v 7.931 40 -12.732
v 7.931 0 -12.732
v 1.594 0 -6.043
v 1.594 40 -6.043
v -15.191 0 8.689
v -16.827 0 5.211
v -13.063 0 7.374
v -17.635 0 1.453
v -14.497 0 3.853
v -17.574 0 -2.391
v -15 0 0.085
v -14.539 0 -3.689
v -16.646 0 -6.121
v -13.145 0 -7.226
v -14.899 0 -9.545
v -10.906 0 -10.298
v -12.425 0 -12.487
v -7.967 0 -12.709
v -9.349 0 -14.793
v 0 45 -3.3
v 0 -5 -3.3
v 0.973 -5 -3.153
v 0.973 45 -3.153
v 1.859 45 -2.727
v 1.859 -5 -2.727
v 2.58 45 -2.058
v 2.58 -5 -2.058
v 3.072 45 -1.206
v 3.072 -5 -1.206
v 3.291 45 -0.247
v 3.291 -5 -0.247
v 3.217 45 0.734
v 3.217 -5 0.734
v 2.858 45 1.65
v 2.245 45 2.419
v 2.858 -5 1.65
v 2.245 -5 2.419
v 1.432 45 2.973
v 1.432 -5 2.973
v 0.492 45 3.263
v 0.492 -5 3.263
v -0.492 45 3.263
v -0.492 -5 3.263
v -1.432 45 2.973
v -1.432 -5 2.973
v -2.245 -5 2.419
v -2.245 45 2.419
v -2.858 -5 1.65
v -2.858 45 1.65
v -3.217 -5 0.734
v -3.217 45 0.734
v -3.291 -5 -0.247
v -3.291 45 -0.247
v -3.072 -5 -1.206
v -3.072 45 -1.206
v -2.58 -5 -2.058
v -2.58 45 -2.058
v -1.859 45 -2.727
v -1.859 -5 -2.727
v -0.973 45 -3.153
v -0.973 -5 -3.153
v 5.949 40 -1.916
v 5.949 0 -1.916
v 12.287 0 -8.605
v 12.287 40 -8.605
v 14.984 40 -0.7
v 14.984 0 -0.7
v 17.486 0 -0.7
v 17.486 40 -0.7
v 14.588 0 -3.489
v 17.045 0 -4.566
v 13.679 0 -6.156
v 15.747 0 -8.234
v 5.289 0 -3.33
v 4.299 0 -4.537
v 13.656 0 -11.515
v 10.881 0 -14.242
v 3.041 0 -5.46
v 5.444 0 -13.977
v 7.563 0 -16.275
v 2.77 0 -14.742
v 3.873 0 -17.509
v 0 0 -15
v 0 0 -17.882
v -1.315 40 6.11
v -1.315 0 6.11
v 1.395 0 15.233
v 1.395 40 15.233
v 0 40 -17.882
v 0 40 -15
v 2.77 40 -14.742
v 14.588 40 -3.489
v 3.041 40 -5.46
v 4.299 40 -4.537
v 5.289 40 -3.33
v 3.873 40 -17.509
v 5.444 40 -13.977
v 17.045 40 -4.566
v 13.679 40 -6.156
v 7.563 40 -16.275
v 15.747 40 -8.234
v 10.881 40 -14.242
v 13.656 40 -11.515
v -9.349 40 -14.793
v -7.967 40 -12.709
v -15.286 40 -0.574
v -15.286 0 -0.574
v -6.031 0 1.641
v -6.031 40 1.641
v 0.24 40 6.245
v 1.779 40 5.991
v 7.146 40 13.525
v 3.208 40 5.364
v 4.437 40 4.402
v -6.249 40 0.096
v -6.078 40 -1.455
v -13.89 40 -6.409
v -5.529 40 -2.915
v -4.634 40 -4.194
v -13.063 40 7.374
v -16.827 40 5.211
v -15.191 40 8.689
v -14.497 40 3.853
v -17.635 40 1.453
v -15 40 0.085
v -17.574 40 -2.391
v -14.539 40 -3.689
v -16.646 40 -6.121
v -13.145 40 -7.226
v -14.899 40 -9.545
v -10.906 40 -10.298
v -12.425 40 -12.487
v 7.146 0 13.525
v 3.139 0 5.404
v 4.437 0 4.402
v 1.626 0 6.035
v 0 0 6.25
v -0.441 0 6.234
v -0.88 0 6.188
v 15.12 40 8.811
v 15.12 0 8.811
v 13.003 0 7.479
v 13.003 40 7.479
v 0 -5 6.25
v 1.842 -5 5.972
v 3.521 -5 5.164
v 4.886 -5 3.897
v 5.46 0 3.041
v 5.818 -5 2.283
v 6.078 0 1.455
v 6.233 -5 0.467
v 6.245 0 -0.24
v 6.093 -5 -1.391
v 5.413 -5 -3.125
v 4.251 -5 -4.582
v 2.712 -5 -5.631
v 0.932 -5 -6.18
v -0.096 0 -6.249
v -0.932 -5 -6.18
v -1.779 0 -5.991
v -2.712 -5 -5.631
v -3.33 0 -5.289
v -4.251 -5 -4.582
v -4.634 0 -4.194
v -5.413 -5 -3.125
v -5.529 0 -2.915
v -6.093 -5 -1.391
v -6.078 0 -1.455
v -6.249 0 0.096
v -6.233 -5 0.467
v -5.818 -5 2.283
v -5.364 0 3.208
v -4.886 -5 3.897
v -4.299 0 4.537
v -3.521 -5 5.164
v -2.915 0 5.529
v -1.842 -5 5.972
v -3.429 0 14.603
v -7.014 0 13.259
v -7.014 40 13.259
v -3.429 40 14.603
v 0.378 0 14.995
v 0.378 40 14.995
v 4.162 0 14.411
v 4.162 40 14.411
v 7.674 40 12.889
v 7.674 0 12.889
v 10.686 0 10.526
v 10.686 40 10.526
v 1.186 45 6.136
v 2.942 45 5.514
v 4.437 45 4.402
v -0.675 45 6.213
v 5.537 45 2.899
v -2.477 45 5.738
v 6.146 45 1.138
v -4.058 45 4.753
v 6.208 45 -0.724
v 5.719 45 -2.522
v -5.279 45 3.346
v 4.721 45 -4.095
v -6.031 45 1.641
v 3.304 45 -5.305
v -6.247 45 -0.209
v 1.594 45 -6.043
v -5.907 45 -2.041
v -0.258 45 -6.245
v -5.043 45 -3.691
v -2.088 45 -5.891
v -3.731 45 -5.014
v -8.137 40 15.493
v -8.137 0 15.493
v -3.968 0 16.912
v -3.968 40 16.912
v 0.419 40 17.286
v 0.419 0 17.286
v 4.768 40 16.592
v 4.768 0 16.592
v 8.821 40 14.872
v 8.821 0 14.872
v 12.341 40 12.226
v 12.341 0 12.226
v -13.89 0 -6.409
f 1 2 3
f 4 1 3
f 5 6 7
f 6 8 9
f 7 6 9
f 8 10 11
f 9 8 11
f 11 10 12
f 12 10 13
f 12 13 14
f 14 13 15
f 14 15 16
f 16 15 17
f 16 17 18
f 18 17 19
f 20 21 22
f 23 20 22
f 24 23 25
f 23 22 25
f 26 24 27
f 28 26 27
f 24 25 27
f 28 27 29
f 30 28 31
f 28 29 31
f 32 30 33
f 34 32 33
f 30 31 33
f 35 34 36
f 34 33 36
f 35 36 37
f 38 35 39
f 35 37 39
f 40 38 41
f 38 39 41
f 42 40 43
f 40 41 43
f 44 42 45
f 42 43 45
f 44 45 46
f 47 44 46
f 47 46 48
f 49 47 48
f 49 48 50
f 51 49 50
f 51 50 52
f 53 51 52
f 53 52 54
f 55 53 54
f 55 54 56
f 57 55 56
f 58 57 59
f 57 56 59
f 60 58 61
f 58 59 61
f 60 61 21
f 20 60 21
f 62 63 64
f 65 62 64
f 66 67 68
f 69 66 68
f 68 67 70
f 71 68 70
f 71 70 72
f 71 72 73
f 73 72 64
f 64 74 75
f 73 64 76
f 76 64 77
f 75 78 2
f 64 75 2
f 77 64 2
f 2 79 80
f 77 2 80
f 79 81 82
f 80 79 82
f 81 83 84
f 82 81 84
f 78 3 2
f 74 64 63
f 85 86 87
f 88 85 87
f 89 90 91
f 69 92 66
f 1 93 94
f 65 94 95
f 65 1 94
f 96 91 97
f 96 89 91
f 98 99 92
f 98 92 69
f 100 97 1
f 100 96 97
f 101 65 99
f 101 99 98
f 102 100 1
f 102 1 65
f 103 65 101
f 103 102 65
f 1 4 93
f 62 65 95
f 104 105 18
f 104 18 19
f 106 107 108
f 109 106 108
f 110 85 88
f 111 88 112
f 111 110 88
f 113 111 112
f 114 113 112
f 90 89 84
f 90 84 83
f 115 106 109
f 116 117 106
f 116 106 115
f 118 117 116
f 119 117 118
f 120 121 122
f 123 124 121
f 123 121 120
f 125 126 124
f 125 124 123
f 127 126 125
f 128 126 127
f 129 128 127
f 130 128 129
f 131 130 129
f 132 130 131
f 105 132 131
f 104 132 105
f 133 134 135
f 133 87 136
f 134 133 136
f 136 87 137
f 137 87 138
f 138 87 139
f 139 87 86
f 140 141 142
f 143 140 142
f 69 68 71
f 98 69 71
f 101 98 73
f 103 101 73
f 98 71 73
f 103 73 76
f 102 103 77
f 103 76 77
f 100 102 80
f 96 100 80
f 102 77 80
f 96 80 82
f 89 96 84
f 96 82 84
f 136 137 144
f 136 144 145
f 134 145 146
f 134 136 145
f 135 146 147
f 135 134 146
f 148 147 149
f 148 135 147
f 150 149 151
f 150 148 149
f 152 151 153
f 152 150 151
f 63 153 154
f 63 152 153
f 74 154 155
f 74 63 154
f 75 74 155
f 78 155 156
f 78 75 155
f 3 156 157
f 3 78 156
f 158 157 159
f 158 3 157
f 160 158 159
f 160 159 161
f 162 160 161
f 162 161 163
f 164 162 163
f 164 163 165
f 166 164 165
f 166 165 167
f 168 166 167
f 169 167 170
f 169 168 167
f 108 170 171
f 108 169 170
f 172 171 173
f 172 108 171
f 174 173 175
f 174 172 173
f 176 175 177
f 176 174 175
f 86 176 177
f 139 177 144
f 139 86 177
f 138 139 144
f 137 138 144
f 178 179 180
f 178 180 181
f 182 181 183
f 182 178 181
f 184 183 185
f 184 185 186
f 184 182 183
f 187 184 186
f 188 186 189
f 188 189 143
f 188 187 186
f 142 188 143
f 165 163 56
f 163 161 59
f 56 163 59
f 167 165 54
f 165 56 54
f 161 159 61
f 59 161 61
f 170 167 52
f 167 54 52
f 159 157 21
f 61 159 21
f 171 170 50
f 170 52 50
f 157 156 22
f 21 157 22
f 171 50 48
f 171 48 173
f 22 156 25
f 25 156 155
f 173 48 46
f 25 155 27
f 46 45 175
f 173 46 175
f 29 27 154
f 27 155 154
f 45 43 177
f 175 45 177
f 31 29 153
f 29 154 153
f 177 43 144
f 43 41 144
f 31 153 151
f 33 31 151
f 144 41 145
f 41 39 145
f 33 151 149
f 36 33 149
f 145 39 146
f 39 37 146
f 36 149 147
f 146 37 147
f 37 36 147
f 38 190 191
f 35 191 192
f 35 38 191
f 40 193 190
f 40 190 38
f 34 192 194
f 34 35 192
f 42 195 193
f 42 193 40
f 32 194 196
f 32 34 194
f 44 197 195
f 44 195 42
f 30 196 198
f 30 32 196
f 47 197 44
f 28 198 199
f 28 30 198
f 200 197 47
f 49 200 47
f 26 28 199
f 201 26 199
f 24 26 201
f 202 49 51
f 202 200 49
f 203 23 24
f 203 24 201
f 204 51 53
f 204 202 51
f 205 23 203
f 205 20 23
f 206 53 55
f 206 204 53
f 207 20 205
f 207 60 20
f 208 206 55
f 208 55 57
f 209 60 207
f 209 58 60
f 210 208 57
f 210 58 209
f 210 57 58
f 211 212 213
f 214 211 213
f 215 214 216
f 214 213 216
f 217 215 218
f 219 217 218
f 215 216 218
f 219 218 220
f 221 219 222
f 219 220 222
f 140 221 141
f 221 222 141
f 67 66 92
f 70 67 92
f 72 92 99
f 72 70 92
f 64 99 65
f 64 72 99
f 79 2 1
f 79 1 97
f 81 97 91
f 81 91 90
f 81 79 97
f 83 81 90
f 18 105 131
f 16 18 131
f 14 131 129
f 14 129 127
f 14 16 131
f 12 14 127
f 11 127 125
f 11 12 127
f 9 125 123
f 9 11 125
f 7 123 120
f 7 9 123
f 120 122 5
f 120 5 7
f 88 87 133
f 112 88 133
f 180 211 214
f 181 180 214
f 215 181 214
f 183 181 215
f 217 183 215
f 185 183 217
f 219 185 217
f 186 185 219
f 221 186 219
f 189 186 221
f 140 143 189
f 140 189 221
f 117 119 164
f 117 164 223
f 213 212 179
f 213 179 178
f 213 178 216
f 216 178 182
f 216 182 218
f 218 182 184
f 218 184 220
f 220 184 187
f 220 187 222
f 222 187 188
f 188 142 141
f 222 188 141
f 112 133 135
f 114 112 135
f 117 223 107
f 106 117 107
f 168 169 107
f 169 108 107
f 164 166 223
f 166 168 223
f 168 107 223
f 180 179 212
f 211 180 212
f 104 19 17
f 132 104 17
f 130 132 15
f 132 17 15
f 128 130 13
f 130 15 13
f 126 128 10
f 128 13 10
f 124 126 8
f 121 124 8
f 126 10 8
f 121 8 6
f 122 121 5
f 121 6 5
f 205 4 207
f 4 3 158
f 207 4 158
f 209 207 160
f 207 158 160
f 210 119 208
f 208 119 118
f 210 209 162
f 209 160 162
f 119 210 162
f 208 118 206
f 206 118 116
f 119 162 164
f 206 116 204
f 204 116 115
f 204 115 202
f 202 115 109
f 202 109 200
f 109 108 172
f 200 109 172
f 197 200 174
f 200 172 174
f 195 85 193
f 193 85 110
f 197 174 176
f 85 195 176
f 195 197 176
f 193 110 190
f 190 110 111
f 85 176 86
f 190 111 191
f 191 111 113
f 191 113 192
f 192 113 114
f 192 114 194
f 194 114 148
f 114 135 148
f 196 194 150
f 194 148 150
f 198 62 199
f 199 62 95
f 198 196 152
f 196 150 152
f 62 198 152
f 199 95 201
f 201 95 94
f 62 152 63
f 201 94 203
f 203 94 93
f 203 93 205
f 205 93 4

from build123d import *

# Parameters (mm, degrees)
BOSS_EXTRUDE6_DEPTH   = 40
BOSS_EXTRUDE6_2_DEPTH = 40
BOSS_EXTRUDE6_3_DEPTH = 40
SKETCH12_R            = 15
CUT_EXTRUDE9_DEPTH    = 40
BOSS_EXTRUDE8_DEPTH   = 40
SKETCH18_R            = 6.25
BOSS_EXTRUDE9_DEPTH   = 45
SKETCH18_2_R          = 6.25
BOSS_EXTRUDE10_DEPTH  = 5
SKETCH19_R            = 3.3
CUT_EXTRUDE10_DEPTH   = 50


with BuildPart() as part:
    # Sketch11 → Boss-Extrude6 (new body)
    with BuildSketch(Plane(origin=(0, 0, 0), x_dir=(1, 0, 0), z_dir=(0, 1, 0))):
        with BuildLine():
            ThreePointArc((-9.349413612, 14.793189822), (-17.216152438, 4.282475359), (-15.190534929, -8.688938287))
            Line((-15.190534929, -8.688938287), (0, 0.700234787))
            Line((0, 0.700234787), (-9.349413612, 14.793189822))
        make_face()
    extrude(amount=BOSS_EXTRUDE6_DEPTH)


with BuildPart() as body_2:
    # Sketch11 → Boss-Extrude6 2 (new body)
    with BuildSketch(Plane(origin=(0, 0, 0), x_dir=(1, 0, 0), z_dir=(0, 1, 0))):
        with BuildLine():
            Line((0, 17.881636961), (0, 0.700234787))
            Line((0, 0.700234787), (17.485984995, 0.700234787))
            ThreePointArc((17.485984995, 0.700234787), (12.345670366, 12.957480113), (0, 17.881636961))
        make_face()
    extrude(amount=BOSS_EXTRUDE6_2_DEPTH)


with BuildPart() as body_3:
    # Sketch11 → Boss-Extrude6 3 (new body)
    with BuildSketch(Plane(origin=(0, 0, 0), x_dir=(1, 0, 0), z_dir=(0, 1, 0))):
        with BuildLine():
            Line((15.120108753, -8.810920002), (0, 0.700234787))
            Line((0, 0.700234787), (-8.136571383, -15.49342461))
            ThreePointArc((-8.136571383, -15.49342461), (4.767573461, -16.592271542), (15.120108753, -8.810920002))
        make_face()
    extrude(amount=BOSS_EXTRUDE6_3_DEPTH)


with BuildPart() as cut_extrude9_tool:
    # Sketch12 → Cut-Extrude9 (new body)
    with BuildSketch(Plane(origin=(0, 0, 0), x_dir=(1, 0, 0), z_dir=(0, 1, 0))):
        Circle(SKETCH12_R)
    extrude(amount=CUT_EXTRUDE9_DEPTH)


with BuildPart() as part_1:
    add(part.part)

    # Cut-Extrude9: cut by cut_extrude9_tool
    add(cut_extrude9_tool.part, mode=Mode.SUBTRACT)


with BuildPart() as body_2_1:
    add(body_2.part)

    # Cut-Extrude9: cut by cut_extrude9_tool
    add(cut_extrude9_tool.part, mode=Mode.SUBTRACT)



with BuildPart() as body_3_1:
    add(body_3.part)

    # Cut-Extrude9: cut by cut_extrude9_tool
    add(cut_extrude9_tool.part, mode=Mode.SUBTRACT)


with BuildPart() as body_4:
    # Sketch17 → Boss-Extrude8 (new body)
    with BuildSketch(Plane(origin=(0, 0, 0), x_dir=(1, 0, 0), z_dir=(0, 1, 0))):
        Polygon((3.368966021, -0.806267914), (12.495130342, 8.824495324), (8.139929807, 12.951507354), (-0.986234515, 3.320744116), (-13.889802298, 6.408852638), (-15.286299289, 0.573632321), (-2.382731506, -2.514476202), (1.394671955, -15.233347962), (7.146369483, -13.525139675), align=None)
    extrude(amount=BOSS_EXTRUDE8_DEPTH)


with BuildPart() as body_2_2:
    add(body_2_1.part)

    add(body_4.part)  # Boss-Extrude9 merges body 4
    # Sketch18 → Boss-Extrude9 (add)
    with BuildSketch(Plane(origin=(0, 0, 0), x_dir=(1, 0, 0), z_dir=(0, 1, 0))):
        Circle(SKETCH18_R)
    extrude(amount=BOSS_EXTRUDE9_DEPTH)

    # Sketch18<2> → Boss-Extrude10 (add)
    with BuildSketch(Plane(origin=(0, 0, 0), x_dir=(1, 0, 0), z_dir=(0, 1, 0))):
        Circle(SKETCH18_2_R)
    extrude(amount=-BOSS_EXTRUDE10_DEPTH)

    # Sketch19 → Cut-Extrude10 (cut)
    with BuildSketch(Plane(origin=(0, -5, 0), x_dir=(-1, 0, 0), z_dir=(0, -1, 0))):
        Circle(SKETCH19_R)
    extrude(amount=-CUT_EXTRUDE10_DEPTH, mode=Mode.SUBTRACT)


solid = Compound([part_1.part, body_3_1.part, body_2_2.part])
